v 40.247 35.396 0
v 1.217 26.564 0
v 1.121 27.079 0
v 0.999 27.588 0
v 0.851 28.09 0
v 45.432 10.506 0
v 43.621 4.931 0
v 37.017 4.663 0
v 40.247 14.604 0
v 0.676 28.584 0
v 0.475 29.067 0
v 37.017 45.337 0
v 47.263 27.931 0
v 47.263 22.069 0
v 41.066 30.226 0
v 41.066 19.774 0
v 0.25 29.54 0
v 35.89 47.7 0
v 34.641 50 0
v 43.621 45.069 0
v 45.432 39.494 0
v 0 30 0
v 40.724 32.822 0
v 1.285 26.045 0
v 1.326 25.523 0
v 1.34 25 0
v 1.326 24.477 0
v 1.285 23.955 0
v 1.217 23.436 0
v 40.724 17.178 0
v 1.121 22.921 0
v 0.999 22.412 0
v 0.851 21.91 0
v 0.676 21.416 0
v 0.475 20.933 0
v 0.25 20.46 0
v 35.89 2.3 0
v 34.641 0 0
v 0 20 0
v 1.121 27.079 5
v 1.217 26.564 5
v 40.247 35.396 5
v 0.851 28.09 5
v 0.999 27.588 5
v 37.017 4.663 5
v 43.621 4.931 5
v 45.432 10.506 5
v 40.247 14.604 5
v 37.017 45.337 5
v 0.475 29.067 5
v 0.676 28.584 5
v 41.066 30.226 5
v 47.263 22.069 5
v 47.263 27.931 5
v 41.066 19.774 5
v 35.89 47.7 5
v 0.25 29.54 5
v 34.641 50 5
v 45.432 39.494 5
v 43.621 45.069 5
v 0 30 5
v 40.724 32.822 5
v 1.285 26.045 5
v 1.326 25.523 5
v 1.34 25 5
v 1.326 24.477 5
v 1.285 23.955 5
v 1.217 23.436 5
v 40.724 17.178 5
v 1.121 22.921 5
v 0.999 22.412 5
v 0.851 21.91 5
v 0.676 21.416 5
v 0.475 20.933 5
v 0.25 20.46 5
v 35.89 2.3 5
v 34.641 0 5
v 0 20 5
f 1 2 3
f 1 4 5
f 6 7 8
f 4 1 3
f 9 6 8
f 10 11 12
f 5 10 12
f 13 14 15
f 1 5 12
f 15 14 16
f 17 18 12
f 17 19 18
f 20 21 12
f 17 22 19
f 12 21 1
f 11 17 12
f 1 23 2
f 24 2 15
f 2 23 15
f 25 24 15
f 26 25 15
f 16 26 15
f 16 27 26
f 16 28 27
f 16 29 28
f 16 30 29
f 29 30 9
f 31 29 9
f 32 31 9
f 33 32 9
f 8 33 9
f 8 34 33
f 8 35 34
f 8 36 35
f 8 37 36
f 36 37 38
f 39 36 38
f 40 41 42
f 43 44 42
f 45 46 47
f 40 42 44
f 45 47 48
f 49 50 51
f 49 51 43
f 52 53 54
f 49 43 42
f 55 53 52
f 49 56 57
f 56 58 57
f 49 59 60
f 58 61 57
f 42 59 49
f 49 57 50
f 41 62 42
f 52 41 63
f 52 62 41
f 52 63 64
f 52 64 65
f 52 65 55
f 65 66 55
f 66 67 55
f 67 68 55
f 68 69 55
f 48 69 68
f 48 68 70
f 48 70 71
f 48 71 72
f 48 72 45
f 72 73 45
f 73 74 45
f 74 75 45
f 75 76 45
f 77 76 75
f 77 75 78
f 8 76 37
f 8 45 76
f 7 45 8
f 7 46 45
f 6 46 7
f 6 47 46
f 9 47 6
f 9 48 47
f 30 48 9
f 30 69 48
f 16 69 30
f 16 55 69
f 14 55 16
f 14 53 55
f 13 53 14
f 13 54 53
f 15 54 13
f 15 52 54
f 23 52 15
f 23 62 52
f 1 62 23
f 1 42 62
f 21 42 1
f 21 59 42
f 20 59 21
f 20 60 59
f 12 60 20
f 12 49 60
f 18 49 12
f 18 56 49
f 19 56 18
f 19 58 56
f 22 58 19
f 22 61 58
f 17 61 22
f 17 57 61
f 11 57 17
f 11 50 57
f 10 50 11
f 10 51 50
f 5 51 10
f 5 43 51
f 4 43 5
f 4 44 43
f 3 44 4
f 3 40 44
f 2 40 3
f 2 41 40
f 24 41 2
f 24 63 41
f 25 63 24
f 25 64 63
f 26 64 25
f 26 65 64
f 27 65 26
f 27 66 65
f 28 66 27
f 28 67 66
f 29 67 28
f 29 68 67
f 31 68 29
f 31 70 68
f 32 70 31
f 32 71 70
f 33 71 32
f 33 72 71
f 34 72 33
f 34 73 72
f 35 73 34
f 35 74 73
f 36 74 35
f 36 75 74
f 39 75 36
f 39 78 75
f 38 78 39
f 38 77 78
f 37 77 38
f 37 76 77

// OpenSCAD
$fn = 32;

// ----------------------------------------------------------------------
// Gear sector: 3 teeth on 60 degrees
// ----------------------------------------------------------------------

// --- parameters (mm) ---
sector_angle = 60;        // sector angle, degrees
root_r = 50;              // root circle radius
tooth_h = 6;              // tooth height over the root circle
teeth = 3;                // number of teeth on the sector
hub_r = 10;               // hub bore radius
plate_t = 5;              // sector thickness, Z
arc_step = 3;             // sampling step of the root/hub arcs, degrees
fit_tol = 0.05;           // declared fit tolerance (prompt contract)
free_tol = 0.2;           // declared free tolerance (prompt contract)

tip_r = root_r + tooth_h;  // tip circle radius

profile = [[34.641, 0], [35.89, 2.3], [37.017, 4.663], [43.621, 4.931], [45.432, 10.506], [40.247, 14.604], [40.724, 17.178], [41.066, 19.774], [47.263, 22.069], [47.263, 27.931], [41.066, 30.226], [40.724, 32.822], [40.247, 35.396], [45.432, 39.494], [43.621, 45.069], [37.017, 45.337], [35.89, 47.7], [34.641, 50], [0, 30], [0.25, 29.54], [0.475, 29.067], [0.676, 28.584], [0.851, 28.09], [0.999, 27.588], [1.121, 27.079], [1.217, 26.564], [1.285, 26.045], [1.326, 25.523], [1.34, 25], [1.326, 24.477], [1.285, 23.955], [1.217, 23.436], [1.121, 22.921], [0.999, 22.412], [0.851, 21.91], [0.676, 21.416], [0.475, 20.933], [0.25, 20.46], [0, 20]];  // primary outline, 39 points, counter clockwise

// --- the one profile operation ---
linear_extrude(height = plate_t) polygon(points = profile);
